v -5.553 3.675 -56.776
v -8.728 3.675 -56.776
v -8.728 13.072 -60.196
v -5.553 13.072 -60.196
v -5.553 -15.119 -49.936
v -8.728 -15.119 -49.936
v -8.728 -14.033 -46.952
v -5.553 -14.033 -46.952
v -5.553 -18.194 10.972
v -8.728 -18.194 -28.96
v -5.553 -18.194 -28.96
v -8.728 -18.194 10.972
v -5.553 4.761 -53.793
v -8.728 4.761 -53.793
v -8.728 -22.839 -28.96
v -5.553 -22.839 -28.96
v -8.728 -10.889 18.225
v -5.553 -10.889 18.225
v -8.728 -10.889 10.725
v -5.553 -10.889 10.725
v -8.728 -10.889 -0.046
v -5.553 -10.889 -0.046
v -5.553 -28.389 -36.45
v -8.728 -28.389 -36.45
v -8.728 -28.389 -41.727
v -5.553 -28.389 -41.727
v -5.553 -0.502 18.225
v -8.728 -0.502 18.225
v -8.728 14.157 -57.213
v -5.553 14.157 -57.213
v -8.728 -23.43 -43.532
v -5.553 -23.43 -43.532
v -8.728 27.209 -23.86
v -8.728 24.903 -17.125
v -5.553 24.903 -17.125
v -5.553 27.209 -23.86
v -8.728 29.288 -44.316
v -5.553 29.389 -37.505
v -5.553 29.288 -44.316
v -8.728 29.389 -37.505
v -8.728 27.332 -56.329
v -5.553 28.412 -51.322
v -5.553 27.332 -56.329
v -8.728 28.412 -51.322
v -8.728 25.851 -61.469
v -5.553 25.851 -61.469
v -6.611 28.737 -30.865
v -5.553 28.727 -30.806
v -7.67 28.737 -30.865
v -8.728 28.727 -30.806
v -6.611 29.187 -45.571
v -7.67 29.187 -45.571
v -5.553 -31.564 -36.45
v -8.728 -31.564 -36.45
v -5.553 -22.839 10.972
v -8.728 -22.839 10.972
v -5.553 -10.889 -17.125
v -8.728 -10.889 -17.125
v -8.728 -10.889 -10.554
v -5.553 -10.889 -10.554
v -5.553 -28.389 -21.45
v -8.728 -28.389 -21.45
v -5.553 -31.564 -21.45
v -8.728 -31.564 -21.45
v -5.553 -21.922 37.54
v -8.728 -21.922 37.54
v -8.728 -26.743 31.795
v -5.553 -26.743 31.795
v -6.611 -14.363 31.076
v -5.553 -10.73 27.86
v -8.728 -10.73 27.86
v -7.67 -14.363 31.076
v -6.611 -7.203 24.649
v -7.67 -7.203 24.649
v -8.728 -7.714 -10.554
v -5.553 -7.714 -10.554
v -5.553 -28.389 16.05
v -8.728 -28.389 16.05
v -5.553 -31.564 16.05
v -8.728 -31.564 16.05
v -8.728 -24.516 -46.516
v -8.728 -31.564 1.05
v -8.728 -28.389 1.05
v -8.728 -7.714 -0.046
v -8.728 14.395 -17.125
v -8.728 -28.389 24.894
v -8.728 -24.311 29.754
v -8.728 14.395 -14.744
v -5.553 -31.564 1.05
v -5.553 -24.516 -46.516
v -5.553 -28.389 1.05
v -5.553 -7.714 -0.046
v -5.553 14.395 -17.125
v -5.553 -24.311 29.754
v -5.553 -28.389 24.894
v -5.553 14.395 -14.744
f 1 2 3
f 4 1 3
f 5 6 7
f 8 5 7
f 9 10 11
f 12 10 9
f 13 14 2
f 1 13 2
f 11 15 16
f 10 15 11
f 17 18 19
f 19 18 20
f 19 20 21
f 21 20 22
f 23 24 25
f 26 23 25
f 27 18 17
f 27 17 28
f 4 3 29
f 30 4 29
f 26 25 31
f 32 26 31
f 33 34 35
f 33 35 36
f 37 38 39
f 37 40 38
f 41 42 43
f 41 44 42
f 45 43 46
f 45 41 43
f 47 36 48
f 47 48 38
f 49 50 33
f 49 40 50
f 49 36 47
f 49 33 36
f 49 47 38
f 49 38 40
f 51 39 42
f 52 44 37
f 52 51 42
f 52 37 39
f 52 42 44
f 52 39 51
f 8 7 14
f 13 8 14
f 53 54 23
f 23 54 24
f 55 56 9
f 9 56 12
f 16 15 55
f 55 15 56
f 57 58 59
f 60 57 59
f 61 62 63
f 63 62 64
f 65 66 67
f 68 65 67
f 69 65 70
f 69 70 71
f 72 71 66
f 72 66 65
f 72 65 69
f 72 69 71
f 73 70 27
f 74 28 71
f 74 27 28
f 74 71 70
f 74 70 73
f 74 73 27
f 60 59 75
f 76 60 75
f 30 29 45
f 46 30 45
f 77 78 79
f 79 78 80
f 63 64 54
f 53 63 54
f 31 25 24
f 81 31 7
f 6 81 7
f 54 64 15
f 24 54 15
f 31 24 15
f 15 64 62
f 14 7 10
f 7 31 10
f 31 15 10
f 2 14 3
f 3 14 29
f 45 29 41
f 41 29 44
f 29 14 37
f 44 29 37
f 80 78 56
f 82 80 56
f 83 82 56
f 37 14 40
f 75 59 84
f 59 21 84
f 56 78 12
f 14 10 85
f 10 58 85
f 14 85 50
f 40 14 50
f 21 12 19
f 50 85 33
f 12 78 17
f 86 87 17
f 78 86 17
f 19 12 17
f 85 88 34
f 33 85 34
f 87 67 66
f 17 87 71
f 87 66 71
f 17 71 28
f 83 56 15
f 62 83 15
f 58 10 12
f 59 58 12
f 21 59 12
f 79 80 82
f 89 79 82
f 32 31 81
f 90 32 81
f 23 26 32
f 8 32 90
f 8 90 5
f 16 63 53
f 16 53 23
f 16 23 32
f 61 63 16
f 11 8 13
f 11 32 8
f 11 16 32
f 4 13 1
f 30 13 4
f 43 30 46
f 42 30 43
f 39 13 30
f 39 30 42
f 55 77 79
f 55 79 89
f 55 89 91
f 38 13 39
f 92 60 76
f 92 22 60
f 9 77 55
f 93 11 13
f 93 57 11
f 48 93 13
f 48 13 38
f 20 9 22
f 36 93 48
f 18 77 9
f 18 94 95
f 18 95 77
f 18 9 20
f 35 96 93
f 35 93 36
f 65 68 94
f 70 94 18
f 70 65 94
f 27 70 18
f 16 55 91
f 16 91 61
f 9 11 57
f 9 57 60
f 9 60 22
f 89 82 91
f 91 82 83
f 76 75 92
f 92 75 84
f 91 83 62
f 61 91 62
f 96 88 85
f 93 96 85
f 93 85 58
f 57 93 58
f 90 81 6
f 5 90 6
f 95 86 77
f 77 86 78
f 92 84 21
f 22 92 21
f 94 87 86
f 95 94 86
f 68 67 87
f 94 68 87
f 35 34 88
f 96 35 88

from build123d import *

# Parameters (mm, degrees)
VERTICALSUPPORT_START     = -8.727944435
VERTICALSUPPORT_OUTLINE_W = 4.644211625
VERTICALSUPPORT_OUTLINE_H = 39.932212354
VERTICALSUPPORT_DEPTH     = 3.175
SKETCH1_W                 = 7.5
SKETCH1_H                 = 17.511250173
CUT_EXTRUDE1_DEPTH        = 70.171999778


# Read off the part's stored shape, not the designer's step: VerticalSupport
with BuildPart() as part:
    # VerticalSupport outline → VerticalSupport (new body)
    with BuildSketch(Plane.YZ.offset(VERTICALSUPPORT_START)):
        with BuildLine():
            Line((3.674649338, -56.776141905), (13.071575546, -60.196343338))
            Line((13.071575546, -60.196343338), (14.157489501, -57.212819267))
            Line((14.157489501, -57.212819267), (25.850623416, -61.468771968))
            add(Edge.make_bspline(
                [(24.902673716, -17.12538653), (30.294038787, -30.457344803), (31.214851934, -44.900745737), (25.850623416, -61.468771968)],
                knots=[0.580400882, 0.580400882, 0.580400882, 0.580400882, 0.976268241, 0.976268241, 0.976268241, 0.976268241], degree=3))
            Line((24.902673716, -17.12538653), (14.394673716, -14.74413653))
            Line((14.394673716, -14.74413653), (14.394673716, -17.12538653))
            Line((14.394673716, -17.12538653), (-10.888823942, -17.12538653))
            Line((-10.888823942, -17.12538653), (-10.888823942, -10.55438653))
            Line((-10.888823942, -10.55438653), (-7.713823942, -10.55438653))
            Line((-7.713823942, -10.55438653), (-7.713823942, -0.04638653))
            Line((-7.713823942, -0.04638653), (-10.888823942, -0.04638653))
            Line((-10.888823942, -0.04638653), (-10.888823942, 10.72461347))
            Line((-10.888823942, 10.72461347), (6.622426231, 10.72461347))
            add(Edge.make_bspline(
                [(-21.922009797, 37.540280116), (-11.188458316, 28.533761028), (-1.433315203, 19.729402601), (6.622426231, 10.72461347)],
                knots=[0, 0, 0, 0, 0.291032797, 0.291032797, 0.291032797, 0.291032797], degree=3))
            Line((-21.922009797, 37.540280116), (-26.742916869, 31.794946793))
            Line((-26.742916869, 31.794946793), (-24.310725762, 29.754096132))
            Line((-24.310725762, 29.754096132), (-28.388823942, 24.894007976))
            Line((-28.388823942, 24.894007976), (-28.388823942, 16.04961347))
            Line((-28.388823942, 16.04961347), (-31.563823942, 16.04961347))
            Line((-31.563823942, 16.04961347), (-31.563823942, 1.04961347))
            Line((-31.563823942, 1.04961347), (-28.388823942, 1.04961347))
            Line((-28.388823942, 1.04961347), (-28.388823942, -21.45038653))
            Line((-28.388823942, -21.45038653), (-31.563823942, -21.45038653))
            Line((-31.563823942, -21.45038653), (-31.563823942, -36.45038653))
            Line((-31.563823942, -36.45038653), (-28.388823942, -36.45038653))
            Line((-28.388823942, -36.45038653), (-28.388823942, -41.727227597))
            Line((-28.388823942, -41.727227597), (-23.430215331, -43.532013534))
            Line((-23.430215331, -43.532013534), (-24.516129286, -46.515537605))
            Line((-24.516129286, -46.515537605), (-15.119203078, -49.935739039))
            Line((-15.119203078, -49.935739039), (-14.033289123, -46.952214968))
            Line((-14.033289123, -46.952214968), (4.760563293, -53.792617834))
            Line((4.760563293, -53.792617834), (3.674649338, -56.776141905))
        make_face()
        with Locations((-20.51645306, -8.993872337)):
            Rectangle(VERTICALSUPPORT_OUTLINE_W, VERTICALSUPPORT_OUTLINE_H, mode=Mode.SUBTRACT)
    extrude(amount=VERTICALSUPPORT_DEPTH)

    # Sketch1 → Cut-Extrude1 (cut, through all)
    with BuildSketch(Plane(origin=(-5.552944435, 0, 0), x_dir=(0, 0, -1), z_dir=(1, 0, 0))):
        with Locations((-14.47461347, -2.133198855)):
            Rectangle(SKETCH1_W, SKETCH1_H)
    extrude(amount=-CUT_EXTRUDE1_DEPTH, mode=Mode.SUBTRACT)


solid = part.part
